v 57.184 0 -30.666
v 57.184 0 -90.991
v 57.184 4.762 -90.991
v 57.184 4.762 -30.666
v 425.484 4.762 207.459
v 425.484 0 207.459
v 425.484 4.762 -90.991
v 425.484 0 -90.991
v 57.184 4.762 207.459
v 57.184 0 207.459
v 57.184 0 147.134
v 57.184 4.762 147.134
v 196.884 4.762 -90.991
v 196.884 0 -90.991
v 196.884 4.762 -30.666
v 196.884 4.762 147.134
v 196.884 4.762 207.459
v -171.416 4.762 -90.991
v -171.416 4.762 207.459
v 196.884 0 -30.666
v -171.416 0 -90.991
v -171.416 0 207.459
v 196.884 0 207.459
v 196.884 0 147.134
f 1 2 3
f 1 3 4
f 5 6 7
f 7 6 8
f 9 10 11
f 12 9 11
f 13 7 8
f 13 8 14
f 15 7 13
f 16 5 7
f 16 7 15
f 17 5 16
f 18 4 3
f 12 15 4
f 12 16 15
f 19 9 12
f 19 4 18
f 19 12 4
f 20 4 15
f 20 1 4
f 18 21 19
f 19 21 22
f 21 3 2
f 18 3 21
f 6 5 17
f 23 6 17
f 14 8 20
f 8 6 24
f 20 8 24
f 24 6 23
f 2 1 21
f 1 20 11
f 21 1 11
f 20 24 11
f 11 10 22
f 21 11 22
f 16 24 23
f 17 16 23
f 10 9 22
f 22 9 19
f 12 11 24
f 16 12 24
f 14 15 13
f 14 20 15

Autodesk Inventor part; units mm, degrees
ref_plane "YZ Plane" through (0, 0, 0) normal (1, 0, 0) x (0, 1, 0)
ref_plane "XZ Plane" through (0, 0, 0) normal (0, 1, 0) x (-1, 0, 0)
ref_plane "XY Plane" through (0, 0, 0) normal (0, 0, 1) x (1, 0, 0)
sketch "Sketch1" plane through (0, 0, 0) normal (0, 1, 0) x (-1, 0, 0)
  line L0 (171.4161, 216.9837) -> (-425.4839, 216.9837)
  line L1 (-425.4839, 216.9837) -> (-425.4839, -100.5163)
  line L2 (-425.4839, -100.5163) -> (171.4161, -100.5163)
  line L3 (171.4161, -100.5163) -> (171.4161, 216.9837)
  point P0 (0, 0)
  dimension "d0" = 317.5
  dimension "d1" = 596.9
extrude "Extrusion1" add sketch "Sketch1" along normal blind 4.7625
sketch "Sketch2" plane through (0, 4.7625, 0) normal (0, 1, 0) x (1, 0, 0)
  line L0 (57.1839, 30.6663) -> (196.8839, 30.6663)
  line L1 (196.8839, 30.6663) -> (196.8839, 100.5163)
  line L2 (196.8839, 100.5163) -> (57.1839, 100.5163)
  line L3 (57.1839, 100.5163) -> (57.1839, 30.6663)
  line L4 (57.1839, -147.1337) -> (196.8839, -147.1337)
  line L5 (196.8839, -147.1337) -> (196.8839, -216.9837)
  line L6 (196.8839, -216.9837) -> (57.1839, -216.9837)
  line L7 (57.1839, -216.9837) -> (57.1839, -147.1337)
  line L8 (425.4839, -216.9837) -> (425.4839, 100.5163) projected
  line L9 (-171.4161, 100.5163) -> (-171.4161, -216.9837) projected
  line L10 (-171.4161, -216.9837) -> (425.4839, -216.9837) projected
  line L11 (425.4839, 100.5163) -> (-171.4161, 100.5163) projected
  point P0 (0, 0)
  dimension "d4" = 0
  dimension "d5" = 228.6
  dimension "d6" = 0
  dimension "d7" = 228.6
  dimension "d8" = 0
  dimension "d9" = 0
  dimension "d10" = 69.85
  dimension "d11" = 69.85
extrude "Extrusion2" cut sketch "Sketch2" along normal mid plane 25.4 contours L3 L2 L1 L0 | L7 L4 L5 L6
sketch "Sketch3" plane through (0, 4.7625, 0) normal (0, 1, 0) x (1, 0, 0)
  line L0 (-203.1439, 127.0873) -> (472.3707, 127.0873)
  line L1 (472.3707, 127.0873) -> (472.3707, 90.9913)
  line L2 (472.3707, 90.9913) -> (-203.1439, 90.9913)
  line L3 (-203.1439, 90.9913) -> (-203.1439, 127.0873)
  line L4 (463.6684, -207.4587) -> (-190.0904, -207.4587)
  line L5 (-190.0904, -207.4587) -> (-190.0904, -244.0242)
  line L6 (-190.0904, -244.0242) -> (463.6684, -244.0242)
  line L7 (463.6684, -244.0242) -> (463.6684, -207.4587)
  line L8 (425.4839, 100.5163) -> (196.8839, 100.5163) projected
  line L9 (196.8839, -216.9837) -> (425.4839, -216.9837) projected
  point P0 (0, 0)
  dimension "d14" = 9.525
  dimension "d15" = 9.525
extrude "Extrusion3" cut sketch "Sketch3" against normal blind 25.4
properties part number "EBoard" material "Polycarbonate, Clear"
